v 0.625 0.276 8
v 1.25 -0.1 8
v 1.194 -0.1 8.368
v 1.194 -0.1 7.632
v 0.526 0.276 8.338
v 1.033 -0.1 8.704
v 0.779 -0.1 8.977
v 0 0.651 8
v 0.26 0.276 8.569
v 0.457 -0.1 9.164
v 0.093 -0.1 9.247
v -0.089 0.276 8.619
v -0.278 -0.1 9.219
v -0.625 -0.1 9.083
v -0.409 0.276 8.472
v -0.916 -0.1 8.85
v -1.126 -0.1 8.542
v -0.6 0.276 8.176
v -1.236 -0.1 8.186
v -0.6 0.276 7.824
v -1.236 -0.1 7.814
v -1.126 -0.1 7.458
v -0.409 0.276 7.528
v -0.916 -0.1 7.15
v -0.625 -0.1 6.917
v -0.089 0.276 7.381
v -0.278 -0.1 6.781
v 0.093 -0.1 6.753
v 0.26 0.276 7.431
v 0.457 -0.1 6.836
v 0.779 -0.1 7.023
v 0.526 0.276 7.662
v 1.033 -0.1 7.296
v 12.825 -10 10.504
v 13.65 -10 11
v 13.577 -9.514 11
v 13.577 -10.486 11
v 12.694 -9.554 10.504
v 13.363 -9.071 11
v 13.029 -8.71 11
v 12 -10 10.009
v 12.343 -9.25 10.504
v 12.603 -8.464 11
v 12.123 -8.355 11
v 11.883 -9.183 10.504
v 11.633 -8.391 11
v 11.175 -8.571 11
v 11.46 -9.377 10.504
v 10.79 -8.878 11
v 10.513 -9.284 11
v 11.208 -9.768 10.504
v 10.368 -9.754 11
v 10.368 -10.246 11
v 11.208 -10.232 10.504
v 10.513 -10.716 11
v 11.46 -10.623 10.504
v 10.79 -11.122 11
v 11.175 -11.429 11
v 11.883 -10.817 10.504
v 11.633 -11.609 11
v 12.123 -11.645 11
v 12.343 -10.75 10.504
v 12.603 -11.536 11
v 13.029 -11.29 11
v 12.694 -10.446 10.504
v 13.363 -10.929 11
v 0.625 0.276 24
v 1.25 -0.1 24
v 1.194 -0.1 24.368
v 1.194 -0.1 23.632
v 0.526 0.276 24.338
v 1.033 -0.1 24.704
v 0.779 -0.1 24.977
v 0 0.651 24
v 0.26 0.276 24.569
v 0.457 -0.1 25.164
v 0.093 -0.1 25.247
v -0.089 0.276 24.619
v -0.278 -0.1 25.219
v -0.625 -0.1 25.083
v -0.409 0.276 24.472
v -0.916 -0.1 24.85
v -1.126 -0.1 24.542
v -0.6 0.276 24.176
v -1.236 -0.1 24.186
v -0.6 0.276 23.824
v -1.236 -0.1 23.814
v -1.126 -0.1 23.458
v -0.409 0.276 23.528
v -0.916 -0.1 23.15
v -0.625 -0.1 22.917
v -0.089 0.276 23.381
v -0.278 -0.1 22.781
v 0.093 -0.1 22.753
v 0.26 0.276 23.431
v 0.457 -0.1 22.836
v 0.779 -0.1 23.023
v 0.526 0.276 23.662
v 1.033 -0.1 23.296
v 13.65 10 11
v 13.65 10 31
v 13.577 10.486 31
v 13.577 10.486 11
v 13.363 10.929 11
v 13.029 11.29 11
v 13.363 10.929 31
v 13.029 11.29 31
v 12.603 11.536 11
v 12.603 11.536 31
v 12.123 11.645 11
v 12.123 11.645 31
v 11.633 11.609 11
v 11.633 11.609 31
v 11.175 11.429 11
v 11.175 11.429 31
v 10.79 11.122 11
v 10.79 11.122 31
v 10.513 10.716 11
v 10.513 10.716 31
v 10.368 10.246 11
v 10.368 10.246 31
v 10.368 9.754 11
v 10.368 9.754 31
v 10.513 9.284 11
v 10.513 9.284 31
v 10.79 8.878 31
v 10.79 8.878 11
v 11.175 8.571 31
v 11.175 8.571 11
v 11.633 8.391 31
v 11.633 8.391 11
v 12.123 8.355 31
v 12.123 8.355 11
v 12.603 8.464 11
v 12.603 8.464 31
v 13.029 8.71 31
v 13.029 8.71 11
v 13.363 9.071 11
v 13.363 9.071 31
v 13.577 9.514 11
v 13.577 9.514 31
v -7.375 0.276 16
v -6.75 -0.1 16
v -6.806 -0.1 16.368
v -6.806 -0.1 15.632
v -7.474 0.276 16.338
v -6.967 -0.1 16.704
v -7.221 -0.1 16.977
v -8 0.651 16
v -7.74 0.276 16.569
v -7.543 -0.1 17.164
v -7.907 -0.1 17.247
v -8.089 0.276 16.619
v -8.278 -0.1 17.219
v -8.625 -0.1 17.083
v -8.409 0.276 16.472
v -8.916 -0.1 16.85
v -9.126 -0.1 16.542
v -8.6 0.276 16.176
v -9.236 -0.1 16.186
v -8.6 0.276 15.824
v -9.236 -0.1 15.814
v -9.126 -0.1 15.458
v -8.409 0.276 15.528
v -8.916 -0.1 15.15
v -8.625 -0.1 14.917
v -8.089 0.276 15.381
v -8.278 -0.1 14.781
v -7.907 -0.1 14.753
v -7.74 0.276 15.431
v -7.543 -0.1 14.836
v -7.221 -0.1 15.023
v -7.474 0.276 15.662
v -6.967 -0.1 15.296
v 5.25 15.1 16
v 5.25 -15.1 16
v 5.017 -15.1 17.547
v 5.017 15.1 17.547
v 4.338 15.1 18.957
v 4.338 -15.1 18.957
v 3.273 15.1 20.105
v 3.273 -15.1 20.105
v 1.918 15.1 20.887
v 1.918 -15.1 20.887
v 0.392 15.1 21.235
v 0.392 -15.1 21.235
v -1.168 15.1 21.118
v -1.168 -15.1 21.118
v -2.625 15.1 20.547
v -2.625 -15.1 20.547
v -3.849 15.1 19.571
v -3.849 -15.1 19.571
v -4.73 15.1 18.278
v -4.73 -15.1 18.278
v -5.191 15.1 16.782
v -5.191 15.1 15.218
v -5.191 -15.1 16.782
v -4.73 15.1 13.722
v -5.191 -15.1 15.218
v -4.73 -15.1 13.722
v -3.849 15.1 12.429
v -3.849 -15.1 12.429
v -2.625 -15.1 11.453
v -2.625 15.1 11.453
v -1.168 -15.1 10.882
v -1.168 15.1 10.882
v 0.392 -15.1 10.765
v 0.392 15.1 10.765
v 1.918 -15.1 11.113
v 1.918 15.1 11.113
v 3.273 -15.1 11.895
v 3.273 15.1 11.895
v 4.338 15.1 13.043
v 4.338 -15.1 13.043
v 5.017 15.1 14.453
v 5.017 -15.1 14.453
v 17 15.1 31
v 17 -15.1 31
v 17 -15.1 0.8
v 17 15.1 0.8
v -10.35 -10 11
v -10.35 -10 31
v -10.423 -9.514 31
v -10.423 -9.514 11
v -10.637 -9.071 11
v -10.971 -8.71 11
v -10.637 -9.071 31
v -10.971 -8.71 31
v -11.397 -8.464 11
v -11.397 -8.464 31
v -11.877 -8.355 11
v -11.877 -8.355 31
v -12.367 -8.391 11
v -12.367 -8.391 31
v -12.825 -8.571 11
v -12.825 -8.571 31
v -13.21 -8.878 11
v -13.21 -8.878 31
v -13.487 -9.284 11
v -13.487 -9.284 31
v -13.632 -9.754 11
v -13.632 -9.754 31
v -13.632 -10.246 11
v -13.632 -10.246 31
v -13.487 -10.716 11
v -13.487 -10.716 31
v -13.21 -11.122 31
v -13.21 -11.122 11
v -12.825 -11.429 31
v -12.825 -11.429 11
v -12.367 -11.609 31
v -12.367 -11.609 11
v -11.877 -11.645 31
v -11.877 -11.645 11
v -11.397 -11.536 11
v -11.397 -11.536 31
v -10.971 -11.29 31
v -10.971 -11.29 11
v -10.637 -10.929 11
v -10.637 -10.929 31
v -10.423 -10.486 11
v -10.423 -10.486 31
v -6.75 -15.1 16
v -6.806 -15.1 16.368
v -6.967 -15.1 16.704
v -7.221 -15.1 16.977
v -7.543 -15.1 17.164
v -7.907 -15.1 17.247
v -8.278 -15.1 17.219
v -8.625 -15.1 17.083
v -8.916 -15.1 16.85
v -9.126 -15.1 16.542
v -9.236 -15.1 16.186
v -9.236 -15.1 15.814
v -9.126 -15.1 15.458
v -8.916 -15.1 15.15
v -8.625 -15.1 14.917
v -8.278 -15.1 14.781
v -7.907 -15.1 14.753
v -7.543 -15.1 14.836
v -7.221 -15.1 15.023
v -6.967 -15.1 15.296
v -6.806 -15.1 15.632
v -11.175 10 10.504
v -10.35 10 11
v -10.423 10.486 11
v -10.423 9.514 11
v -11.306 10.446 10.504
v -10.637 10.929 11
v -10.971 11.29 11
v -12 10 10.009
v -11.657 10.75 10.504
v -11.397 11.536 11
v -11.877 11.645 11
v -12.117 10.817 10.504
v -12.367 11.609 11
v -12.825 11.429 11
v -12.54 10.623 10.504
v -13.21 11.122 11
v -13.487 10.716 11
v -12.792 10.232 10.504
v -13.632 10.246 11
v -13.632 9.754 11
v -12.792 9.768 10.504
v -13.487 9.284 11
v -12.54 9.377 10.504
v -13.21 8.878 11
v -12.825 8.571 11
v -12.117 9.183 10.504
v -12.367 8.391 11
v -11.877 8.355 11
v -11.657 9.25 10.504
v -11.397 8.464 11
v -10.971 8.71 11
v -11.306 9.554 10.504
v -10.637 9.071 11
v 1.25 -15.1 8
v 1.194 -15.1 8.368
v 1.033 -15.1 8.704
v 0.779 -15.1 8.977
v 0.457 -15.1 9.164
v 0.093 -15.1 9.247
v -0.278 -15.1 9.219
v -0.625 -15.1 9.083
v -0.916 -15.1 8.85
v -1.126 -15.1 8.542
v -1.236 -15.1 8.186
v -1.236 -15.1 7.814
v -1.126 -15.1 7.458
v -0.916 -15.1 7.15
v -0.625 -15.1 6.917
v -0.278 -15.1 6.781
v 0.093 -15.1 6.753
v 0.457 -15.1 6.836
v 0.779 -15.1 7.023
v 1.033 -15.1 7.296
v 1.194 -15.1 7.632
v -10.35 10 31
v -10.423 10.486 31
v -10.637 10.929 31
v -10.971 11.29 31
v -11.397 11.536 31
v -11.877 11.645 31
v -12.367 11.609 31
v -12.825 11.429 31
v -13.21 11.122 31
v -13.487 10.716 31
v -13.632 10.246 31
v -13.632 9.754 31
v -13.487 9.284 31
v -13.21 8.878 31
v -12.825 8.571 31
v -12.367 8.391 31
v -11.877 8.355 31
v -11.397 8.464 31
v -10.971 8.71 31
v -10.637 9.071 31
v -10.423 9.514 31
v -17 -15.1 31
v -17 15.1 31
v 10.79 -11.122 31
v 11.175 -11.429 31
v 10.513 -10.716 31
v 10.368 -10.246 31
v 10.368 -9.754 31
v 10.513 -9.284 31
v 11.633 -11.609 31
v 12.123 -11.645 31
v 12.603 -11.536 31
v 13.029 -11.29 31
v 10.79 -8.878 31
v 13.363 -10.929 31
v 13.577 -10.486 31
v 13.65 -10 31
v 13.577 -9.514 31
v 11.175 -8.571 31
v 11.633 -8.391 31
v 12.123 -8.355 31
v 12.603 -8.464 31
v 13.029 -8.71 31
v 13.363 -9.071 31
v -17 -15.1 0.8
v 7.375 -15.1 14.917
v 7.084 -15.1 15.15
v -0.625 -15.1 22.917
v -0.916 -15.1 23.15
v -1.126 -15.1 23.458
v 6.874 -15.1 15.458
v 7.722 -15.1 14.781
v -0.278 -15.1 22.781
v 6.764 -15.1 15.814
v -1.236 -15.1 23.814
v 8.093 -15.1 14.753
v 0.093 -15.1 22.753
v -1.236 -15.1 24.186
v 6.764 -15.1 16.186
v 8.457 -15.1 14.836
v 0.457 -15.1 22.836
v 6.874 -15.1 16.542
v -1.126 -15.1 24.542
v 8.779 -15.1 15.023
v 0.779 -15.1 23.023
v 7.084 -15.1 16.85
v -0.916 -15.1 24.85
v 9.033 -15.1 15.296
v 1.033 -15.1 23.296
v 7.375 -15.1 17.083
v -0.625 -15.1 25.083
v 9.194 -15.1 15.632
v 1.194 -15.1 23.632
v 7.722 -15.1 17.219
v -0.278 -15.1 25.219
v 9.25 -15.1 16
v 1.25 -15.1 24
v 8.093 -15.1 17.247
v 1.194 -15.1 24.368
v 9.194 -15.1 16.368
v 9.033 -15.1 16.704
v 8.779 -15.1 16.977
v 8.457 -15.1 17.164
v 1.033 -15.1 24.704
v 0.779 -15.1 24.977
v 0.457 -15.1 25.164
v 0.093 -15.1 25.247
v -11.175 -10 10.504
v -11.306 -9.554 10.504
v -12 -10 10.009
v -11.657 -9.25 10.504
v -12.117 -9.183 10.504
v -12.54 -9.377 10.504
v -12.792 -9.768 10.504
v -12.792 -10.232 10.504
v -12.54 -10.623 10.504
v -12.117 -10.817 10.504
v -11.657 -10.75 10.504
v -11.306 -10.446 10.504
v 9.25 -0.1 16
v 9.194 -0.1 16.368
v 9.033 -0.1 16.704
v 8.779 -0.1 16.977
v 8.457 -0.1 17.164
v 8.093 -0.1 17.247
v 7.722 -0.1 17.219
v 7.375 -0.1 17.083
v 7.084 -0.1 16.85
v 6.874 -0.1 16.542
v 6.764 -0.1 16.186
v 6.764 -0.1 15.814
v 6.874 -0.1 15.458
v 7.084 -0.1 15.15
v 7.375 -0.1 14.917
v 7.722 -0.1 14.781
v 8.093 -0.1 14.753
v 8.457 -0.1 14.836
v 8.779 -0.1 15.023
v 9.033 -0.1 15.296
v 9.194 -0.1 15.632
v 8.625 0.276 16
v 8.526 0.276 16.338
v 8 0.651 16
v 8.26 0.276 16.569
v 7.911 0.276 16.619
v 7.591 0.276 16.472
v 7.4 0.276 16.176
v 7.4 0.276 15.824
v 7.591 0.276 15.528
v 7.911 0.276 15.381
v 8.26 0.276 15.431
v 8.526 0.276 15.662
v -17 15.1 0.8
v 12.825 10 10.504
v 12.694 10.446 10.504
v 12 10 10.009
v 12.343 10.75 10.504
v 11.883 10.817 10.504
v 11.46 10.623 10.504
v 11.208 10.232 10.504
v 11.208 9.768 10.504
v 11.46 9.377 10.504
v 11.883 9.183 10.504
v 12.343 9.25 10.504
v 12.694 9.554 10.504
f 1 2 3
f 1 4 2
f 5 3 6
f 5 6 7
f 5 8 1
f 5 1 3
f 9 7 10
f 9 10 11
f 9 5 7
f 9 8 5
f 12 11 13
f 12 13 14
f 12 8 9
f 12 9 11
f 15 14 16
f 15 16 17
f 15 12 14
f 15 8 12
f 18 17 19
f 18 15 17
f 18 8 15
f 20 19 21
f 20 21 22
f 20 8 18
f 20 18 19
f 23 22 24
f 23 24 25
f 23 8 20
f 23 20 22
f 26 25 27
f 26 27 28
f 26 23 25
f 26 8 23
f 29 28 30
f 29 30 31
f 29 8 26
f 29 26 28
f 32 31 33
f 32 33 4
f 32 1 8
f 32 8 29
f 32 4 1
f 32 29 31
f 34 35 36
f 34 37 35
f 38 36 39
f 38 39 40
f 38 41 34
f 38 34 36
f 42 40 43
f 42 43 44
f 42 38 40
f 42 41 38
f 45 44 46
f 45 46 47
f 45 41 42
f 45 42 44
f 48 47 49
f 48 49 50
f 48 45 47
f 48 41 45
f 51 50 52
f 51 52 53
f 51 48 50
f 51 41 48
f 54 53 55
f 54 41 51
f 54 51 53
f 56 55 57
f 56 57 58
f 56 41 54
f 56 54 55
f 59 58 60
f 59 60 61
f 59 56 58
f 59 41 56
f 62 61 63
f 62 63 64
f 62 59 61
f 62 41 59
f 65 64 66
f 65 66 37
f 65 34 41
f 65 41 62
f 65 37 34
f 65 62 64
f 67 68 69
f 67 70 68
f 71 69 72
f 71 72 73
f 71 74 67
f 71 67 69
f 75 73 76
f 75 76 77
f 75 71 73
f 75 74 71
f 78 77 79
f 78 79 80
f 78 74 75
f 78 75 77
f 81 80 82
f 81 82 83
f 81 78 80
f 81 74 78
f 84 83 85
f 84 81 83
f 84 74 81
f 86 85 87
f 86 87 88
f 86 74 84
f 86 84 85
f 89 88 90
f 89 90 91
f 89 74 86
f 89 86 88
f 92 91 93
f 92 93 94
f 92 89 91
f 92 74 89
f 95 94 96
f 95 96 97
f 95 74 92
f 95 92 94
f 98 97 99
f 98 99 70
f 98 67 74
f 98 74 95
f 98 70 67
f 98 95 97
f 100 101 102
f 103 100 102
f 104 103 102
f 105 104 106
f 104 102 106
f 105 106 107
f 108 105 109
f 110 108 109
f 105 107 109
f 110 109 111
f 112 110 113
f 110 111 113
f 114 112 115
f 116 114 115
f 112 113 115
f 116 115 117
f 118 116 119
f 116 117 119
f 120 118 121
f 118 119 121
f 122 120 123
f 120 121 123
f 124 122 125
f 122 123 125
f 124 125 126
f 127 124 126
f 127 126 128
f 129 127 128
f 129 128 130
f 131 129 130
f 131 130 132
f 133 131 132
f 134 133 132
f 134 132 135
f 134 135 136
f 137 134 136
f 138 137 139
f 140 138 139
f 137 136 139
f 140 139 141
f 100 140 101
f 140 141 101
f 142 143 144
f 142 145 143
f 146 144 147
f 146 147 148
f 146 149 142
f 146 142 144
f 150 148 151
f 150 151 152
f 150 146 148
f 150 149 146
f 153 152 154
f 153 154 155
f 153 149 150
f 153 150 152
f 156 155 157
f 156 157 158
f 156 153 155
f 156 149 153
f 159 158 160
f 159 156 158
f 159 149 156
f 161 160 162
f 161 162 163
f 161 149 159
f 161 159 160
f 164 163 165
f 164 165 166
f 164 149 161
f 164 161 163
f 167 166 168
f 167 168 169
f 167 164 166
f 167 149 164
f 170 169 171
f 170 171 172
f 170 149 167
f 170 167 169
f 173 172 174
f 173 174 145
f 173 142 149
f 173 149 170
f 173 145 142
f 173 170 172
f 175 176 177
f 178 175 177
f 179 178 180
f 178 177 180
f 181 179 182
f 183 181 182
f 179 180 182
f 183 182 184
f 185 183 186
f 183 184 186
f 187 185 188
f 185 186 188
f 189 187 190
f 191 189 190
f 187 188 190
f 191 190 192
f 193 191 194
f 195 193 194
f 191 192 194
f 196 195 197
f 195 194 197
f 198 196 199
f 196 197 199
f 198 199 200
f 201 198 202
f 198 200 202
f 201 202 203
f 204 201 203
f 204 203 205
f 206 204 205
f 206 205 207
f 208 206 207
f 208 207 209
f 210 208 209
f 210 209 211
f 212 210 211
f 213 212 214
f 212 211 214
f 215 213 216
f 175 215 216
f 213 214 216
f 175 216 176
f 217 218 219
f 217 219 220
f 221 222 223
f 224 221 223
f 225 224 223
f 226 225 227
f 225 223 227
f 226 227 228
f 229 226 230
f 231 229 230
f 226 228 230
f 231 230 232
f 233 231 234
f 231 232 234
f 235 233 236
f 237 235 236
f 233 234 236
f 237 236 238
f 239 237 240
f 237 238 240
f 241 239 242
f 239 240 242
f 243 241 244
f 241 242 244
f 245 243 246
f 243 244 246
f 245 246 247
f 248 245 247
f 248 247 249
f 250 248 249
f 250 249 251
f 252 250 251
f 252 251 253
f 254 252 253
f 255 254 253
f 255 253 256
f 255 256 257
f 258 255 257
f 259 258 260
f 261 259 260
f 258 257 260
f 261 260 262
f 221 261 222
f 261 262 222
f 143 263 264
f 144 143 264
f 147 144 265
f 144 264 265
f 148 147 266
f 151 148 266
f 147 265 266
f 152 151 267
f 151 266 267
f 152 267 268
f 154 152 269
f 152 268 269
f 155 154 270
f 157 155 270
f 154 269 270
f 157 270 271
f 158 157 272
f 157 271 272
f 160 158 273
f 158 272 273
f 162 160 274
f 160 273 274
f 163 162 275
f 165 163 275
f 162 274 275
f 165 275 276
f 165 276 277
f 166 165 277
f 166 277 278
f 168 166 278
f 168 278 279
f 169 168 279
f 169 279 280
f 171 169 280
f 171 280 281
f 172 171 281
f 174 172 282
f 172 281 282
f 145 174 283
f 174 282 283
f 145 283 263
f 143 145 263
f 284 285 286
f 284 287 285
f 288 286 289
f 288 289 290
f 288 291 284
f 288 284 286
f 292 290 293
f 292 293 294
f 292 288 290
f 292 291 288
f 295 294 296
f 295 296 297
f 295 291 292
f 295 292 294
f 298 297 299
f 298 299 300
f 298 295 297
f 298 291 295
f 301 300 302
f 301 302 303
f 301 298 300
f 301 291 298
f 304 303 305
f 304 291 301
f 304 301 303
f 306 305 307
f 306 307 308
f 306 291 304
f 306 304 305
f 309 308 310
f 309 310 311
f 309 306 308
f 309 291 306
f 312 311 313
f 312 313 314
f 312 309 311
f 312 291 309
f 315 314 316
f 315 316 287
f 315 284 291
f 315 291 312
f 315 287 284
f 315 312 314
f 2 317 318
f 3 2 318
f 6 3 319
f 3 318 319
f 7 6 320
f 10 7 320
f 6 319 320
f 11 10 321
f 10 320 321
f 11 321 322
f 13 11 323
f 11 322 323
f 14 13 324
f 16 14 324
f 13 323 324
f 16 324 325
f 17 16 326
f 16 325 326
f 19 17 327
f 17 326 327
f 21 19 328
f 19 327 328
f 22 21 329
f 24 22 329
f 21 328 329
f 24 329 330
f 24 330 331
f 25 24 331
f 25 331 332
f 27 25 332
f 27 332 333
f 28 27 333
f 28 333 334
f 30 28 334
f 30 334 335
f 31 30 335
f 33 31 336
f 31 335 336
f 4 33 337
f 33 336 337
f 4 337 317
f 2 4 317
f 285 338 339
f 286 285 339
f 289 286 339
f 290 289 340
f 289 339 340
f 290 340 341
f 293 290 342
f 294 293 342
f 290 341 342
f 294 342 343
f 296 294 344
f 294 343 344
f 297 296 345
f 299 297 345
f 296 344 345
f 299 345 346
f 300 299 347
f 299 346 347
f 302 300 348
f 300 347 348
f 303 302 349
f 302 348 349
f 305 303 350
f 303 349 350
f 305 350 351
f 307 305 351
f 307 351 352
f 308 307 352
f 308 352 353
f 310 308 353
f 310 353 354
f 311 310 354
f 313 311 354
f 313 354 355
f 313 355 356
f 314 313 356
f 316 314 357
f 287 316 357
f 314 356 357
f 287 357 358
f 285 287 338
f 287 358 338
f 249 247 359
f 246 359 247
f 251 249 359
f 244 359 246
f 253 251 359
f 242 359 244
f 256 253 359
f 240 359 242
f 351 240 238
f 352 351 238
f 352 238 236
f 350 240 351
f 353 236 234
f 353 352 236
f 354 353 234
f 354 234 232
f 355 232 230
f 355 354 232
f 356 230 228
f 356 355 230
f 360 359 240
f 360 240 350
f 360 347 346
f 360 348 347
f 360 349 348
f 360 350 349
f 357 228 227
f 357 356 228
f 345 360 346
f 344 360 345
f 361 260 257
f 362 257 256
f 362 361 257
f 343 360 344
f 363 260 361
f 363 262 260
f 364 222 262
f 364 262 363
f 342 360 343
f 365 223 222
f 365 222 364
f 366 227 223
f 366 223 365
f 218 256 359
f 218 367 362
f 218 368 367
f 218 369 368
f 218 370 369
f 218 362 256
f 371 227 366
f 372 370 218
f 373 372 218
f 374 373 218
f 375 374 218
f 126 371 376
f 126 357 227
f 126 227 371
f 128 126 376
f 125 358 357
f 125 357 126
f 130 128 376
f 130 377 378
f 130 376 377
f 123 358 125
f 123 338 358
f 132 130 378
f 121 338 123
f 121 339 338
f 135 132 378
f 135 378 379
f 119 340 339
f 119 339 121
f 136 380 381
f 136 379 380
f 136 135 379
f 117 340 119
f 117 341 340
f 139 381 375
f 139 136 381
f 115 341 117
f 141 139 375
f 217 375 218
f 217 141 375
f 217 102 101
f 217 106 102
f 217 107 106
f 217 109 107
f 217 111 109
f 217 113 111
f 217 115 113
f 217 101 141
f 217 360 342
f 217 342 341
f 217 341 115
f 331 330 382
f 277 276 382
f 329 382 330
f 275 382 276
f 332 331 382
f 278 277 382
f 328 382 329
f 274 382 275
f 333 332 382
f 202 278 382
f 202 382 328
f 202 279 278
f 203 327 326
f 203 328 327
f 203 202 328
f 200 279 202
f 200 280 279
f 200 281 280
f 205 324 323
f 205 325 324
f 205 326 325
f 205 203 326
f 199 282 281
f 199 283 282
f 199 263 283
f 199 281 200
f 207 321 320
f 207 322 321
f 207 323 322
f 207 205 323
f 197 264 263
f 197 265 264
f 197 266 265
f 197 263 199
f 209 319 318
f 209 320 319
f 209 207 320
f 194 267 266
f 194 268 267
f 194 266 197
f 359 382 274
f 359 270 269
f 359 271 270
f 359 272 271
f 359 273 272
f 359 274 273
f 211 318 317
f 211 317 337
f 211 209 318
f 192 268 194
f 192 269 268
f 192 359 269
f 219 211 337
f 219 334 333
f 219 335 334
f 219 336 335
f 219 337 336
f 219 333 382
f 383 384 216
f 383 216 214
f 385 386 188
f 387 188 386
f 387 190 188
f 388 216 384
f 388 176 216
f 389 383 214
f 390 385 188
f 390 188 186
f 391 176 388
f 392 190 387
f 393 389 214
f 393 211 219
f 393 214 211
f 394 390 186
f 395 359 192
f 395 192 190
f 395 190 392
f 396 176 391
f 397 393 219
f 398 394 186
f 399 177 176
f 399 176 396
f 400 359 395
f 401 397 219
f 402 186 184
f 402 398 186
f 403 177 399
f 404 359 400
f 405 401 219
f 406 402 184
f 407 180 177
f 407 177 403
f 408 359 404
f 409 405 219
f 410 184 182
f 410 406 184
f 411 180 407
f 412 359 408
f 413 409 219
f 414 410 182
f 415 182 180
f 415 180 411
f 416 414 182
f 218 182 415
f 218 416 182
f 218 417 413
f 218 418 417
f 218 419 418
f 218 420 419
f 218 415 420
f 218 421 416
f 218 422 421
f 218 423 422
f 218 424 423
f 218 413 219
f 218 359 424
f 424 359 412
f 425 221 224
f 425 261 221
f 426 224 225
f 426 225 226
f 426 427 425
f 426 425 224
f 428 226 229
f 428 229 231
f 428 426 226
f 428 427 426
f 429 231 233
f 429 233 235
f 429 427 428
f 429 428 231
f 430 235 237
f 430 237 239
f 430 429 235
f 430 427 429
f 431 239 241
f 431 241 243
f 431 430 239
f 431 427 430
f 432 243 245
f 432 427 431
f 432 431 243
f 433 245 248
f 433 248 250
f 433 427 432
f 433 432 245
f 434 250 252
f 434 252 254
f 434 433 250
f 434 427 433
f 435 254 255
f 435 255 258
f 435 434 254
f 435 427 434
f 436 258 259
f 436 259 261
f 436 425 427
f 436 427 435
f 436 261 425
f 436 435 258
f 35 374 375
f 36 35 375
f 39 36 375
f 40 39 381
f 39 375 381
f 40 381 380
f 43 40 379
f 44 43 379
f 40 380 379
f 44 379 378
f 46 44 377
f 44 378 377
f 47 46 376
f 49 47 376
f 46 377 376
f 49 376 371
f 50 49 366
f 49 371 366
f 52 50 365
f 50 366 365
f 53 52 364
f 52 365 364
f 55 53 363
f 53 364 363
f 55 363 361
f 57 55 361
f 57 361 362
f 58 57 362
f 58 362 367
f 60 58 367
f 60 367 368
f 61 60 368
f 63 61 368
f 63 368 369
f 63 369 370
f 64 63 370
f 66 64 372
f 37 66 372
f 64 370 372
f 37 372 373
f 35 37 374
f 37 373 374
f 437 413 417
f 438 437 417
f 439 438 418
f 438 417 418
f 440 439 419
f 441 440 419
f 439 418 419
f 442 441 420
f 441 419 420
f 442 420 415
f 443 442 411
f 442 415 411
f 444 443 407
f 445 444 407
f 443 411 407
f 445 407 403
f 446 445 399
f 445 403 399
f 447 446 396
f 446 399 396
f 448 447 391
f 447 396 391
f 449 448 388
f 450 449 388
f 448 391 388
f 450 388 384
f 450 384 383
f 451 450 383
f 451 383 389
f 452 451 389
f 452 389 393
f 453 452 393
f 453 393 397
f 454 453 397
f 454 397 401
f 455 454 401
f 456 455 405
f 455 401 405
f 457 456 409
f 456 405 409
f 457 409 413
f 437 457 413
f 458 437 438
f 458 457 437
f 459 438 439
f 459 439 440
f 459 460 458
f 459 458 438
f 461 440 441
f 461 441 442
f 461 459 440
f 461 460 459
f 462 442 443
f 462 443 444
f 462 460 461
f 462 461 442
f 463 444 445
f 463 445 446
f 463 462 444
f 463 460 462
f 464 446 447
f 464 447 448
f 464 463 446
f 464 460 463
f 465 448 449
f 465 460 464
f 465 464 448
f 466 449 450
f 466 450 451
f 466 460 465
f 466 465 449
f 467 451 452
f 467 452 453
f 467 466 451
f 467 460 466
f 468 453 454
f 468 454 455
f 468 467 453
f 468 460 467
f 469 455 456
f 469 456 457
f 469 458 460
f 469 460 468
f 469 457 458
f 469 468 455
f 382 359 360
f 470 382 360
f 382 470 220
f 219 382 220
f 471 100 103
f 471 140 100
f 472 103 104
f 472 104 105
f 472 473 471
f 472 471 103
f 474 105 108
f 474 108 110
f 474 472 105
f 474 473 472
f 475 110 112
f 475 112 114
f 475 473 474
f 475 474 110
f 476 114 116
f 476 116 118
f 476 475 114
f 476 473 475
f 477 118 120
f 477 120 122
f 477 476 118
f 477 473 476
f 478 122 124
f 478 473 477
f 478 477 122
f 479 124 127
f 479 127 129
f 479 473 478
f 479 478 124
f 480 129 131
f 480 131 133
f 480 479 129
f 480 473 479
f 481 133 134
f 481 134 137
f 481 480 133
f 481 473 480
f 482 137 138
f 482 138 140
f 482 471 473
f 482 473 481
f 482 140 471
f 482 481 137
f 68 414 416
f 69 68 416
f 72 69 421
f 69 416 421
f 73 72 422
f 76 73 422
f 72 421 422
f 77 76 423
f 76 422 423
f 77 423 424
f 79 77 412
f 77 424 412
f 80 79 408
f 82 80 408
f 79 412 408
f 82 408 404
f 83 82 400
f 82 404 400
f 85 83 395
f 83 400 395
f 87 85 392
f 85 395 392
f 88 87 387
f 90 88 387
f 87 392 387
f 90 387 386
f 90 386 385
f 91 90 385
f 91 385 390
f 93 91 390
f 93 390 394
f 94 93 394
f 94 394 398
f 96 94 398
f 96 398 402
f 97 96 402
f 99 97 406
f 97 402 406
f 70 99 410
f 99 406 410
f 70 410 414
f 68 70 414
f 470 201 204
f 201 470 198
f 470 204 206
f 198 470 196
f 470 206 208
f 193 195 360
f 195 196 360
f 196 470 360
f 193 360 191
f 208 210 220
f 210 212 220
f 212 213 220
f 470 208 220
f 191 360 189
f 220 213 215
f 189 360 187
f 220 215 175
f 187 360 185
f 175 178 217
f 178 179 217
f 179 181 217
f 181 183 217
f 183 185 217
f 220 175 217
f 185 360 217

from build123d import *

# Parameters (mm, degrees)
SKETCH495_W       = 34
SKETCH495_H       = 30.2
PAD219_DEPTH      = 15
PAD219_DEPTH_BACK = 15.2
SKETCH726_R       = 1.65
HOLE001_DEPTH     = 20
HOLE001_TIPS_R    = 1.65
SKETCH727_R       = 5.25
POCKET255_DEPTH   = 30.2
SKETCH728_R       = 1.25
HOLE002_DEPTH     = 15
HOLE002_TIPS_R    = 1.25


with BuildPart() as part:
    # Sketch495 → Pad219 (new body, two sides)
    with BuildSketch(Plane.XY) as pad219_sk:
        Rectangle(SKETCH495_W, SKETCH495_H)
    extrude(amount=PAD219_DEPTH)
    extrude(pad219_sk.sketch, amount=-PAD219_DEPTH_BACK)

    # Sketch726 (on Face6 of Pad219) → Hole001 (cut)
    with BuildSketch(Plane.XY.offset(15)):
        with Locations((-12, 10)):
            Circle(SKETCH726_R)
        with Locations((12, 10)):
            Circle(SKETCH726_R)
        with Locations((12, -10)):
            Circle(SKETCH726_R)
        with Locations((-12, -10)):
            Circle(SKETCH726_R)
    extrude(amount=-HOLE001_DEPTH, mode=Mode.SUBTRACT)

    # Hole001 tips → Hole001 tip 1 section 0
    with BuildSketch(Plane.XY.offset(-5), mode=Mode.PRIVATE) as hole001_tip_1_s0:
        with Locations((-12, 10)):
            Circle(HOLE001_TIPS_R)
    loft([hole001_tip_1_s0.sketch, Vertex(-12, 10, -5.99142)], mode=Mode.SUBTRACT)

    # Hole001 tips → Hole001 tip 2 section 0
    with BuildSketch(Plane.XY.offset(-5), mode=Mode.PRIVATE) as hole001_tip_2_s0:
        with Locations((12, 10)):
            Circle(HOLE001_TIPS_R)
    loft([hole001_tip_2_s0.sketch, Vertex(12, 10, -5.99142)], mode=Mode.SUBTRACT)

    # Hole001 tips → Hole001 tip 3 section 0
    with BuildSketch(Plane.XY.offset(-5), mode=Mode.PRIVATE) as hole001_tip_3_s0:
        with Locations((12, -10)):
            Circle(HOLE001_TIPS_R)
    loft([hole001_tip_3_s0.sketch, Vertex(12, -10, -5.99142)], mode=Mode.SUBTRACT)

    # Hole001 tips → Hole001 tip 4 section 0
    with BuildSketch(Plane.XY.offset(-5), mode=Mode.PRIVATE) as hole001_tip_4_s0:
        with Locations((-12, -10)):
            Circle(HOLE001_TIPS_R)
    loft([hole001_tip_4_s0.sketch, Vertex(-12, -10, -5.99142)], mode=Mode.SUBTRACT)

    # Sketch727 (on Face3 of Hole001) → Pocket255 (cut)
    with BuildSketch(Plane.XZ.offset(15.1)):
        Circle(SKETCH727_R)
    extrude(amount=-POCKET255_DEPTH, mode=Mode.SUBTRACT)

    # Sketch728 (on Face3 of Pocket255) → Hole002 (cut)
    with BuildSketch(Plane.XZ.offset(15.1)):
        with Locations((0, 8)):
            Circle(SKETCH728_R)
        with Locations((8, 0)):
            Circle(SKETCH728_R)
        with Locations((0, -8)):
            Circle(SKETCH728_R)
        with Locations((-8, 0)):
            Circle(SKETCH728_R)
    extrude(amount=-HOLE002_DEPTH, mode=Mode.SUBTRACT)

    # Hole002 tips → Hole002 tip 1 section 0
    with BuildSketch(Plane.XZ.offset(0.1), mode=Mode.PRIVATE) as hole002_tip_1_s0:
        with Locations((0, 8)):
            Circle(HOLE002_TIPS_R)
    loft([hole002_tip_1_s0.sketch, Vertex(0, 0.651076, 8)], mode=Mode.SUBTRACT)

    # Hole002 tips → Hole002 tip 2 section 0
    with BuildSketch(Plane.XZ.offset(0.1), mode=Mode.PRIVATE) as hole002_tip_2_s0:
        with Locations((8, 0)):
            Circle(HOLE002_TIPS_R)
    loft([hole002_tip_2_s0.sketch, Vertex(8, 0.651076, 0)], mode=Mode.SUBTRACT)

    # Hole002 tips → Hole002 tip 3 section 0
    with BuildSketch(Plane.XZ.offset(0.1), mode=Mode.PRIVATE) as hole002_tip_3_s0:
        with Locations((0, -8)):
            Circle(HOLE002_TIPS_R)
    loft([hole002_tip_3_s0.sketch, Vertex(0, 0.651076, -8)], mode=Mode.SUBTRACT)

    # Hole002 tips → Hole002 tip 4 section 0
    with BuildSketch(Plane.XZ.offset(0.1), mode=Mode.PRIVATE) as hole002_tip_4_s0:
        with Locations((-8, 0)):
            Circle(HOLE002_TIPS_R)
    loft([hole002_tip_4_s0.sketch, Vertex(-8, 0.651076, 0)], mode=Mode.SUBTRACT)


with BuildPart() as part_1:
    # Body150 placement: moved
    add(part.part.moved(Location((0, 0, 16))))


solid = part_1.part
